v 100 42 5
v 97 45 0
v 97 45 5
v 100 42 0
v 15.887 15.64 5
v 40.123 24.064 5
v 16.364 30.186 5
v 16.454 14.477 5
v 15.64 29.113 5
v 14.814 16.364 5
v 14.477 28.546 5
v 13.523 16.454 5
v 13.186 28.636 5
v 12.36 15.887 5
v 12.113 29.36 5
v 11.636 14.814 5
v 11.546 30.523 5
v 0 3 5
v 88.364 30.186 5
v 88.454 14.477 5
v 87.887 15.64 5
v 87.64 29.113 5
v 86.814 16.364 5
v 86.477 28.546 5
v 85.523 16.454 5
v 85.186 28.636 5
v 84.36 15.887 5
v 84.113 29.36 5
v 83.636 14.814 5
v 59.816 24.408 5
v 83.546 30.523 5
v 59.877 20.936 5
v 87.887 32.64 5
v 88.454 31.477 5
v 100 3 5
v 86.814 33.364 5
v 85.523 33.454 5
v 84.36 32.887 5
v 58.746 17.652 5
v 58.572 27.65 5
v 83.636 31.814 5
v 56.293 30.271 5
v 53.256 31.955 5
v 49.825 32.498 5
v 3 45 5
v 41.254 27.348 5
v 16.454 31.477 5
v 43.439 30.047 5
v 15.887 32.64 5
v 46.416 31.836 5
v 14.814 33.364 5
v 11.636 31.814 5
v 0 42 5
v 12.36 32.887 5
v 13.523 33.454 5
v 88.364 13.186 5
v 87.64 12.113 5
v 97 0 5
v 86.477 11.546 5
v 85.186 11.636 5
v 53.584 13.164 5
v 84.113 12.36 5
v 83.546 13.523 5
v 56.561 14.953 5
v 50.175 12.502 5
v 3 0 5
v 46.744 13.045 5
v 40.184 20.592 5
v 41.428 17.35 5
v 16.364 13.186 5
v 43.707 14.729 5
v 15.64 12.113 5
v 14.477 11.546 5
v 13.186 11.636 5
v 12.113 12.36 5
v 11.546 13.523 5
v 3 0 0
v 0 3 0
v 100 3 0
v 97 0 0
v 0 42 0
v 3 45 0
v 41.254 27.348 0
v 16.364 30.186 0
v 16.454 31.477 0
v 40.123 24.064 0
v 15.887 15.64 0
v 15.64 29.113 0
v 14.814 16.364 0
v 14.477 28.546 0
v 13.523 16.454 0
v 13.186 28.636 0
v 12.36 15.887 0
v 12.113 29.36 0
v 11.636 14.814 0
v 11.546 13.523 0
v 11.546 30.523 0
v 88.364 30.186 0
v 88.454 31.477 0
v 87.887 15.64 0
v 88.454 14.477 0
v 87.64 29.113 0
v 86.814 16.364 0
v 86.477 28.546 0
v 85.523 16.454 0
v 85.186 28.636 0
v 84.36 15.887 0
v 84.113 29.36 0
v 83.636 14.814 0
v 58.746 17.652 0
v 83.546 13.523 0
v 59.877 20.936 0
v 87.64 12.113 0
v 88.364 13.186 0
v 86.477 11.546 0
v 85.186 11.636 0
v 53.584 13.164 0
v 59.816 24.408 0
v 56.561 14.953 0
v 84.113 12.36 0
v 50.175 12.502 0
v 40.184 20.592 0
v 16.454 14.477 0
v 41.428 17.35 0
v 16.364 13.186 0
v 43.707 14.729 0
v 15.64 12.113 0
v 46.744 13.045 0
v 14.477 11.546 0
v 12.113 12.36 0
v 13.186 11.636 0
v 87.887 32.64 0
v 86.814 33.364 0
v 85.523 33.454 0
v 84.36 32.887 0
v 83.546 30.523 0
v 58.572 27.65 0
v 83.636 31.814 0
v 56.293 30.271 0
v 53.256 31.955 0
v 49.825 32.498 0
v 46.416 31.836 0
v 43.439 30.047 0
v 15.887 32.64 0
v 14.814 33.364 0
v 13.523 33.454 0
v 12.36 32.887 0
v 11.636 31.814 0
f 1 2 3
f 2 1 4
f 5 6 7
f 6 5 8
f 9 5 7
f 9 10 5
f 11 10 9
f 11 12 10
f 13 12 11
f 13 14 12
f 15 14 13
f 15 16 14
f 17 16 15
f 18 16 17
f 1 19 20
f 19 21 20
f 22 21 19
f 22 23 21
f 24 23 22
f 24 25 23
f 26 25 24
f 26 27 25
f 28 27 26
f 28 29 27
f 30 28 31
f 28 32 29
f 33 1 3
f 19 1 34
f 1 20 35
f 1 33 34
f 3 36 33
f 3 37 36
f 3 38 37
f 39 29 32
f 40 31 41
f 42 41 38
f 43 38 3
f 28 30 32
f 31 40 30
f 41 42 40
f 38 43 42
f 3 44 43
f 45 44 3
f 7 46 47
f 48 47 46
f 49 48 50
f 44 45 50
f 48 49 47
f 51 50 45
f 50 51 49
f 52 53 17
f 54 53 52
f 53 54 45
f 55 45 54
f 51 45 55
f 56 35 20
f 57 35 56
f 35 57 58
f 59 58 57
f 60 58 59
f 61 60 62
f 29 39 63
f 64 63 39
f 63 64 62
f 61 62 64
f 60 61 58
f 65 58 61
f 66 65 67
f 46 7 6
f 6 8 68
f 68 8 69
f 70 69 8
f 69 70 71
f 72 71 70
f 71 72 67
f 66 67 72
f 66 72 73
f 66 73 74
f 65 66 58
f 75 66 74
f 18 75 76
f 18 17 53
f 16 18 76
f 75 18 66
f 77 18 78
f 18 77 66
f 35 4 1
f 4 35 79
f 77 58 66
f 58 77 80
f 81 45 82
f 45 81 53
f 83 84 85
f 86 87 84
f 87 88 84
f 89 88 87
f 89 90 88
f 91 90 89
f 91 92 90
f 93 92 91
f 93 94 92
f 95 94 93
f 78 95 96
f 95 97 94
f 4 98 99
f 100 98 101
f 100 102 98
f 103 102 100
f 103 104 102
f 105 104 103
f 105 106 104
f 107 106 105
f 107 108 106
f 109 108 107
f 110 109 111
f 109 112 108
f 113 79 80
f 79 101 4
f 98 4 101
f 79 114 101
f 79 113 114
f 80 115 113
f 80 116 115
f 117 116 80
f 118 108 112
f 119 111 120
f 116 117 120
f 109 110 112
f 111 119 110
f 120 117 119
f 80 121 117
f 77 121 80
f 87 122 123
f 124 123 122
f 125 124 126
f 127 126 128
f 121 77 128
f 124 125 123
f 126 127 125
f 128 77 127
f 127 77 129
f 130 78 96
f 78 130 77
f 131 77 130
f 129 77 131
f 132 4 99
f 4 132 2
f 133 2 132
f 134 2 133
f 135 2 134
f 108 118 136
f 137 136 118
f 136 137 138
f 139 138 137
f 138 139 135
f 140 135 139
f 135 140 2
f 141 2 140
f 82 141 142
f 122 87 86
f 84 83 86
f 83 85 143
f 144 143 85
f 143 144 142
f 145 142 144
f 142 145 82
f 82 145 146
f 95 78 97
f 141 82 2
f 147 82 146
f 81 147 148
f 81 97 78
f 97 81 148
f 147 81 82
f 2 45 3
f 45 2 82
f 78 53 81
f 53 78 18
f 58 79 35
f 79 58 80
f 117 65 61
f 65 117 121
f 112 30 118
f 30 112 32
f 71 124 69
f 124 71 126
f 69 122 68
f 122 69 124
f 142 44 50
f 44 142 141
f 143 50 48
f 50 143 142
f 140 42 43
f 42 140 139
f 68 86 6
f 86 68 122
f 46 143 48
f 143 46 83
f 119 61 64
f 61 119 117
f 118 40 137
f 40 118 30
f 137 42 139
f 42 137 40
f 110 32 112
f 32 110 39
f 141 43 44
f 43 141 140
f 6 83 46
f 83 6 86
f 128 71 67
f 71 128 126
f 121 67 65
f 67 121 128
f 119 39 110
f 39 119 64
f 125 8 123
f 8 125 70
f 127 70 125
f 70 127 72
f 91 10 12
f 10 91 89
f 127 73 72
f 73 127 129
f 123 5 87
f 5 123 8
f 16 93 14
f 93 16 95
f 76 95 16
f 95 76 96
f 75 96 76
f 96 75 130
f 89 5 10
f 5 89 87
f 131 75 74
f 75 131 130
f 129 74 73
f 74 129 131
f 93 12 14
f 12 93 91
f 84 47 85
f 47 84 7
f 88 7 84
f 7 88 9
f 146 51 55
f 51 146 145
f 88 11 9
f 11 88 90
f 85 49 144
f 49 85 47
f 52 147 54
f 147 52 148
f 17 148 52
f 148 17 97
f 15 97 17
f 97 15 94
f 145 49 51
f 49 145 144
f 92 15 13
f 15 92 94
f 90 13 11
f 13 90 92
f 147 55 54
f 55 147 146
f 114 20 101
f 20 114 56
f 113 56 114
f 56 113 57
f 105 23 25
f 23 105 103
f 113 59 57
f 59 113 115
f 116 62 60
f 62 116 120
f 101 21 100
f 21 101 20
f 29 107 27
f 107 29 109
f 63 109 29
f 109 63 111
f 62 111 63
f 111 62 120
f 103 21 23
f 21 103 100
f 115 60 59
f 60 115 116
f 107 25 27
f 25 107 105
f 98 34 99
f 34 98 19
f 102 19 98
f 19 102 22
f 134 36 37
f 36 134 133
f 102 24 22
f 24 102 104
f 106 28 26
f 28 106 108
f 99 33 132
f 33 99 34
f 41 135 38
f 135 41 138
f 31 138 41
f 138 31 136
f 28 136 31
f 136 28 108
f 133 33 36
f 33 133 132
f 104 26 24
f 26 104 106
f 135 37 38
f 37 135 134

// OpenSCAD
$fn = 32;

// ----------------------------------------------------------------------
// Spacer plate: rect 100 x 45
// ----------------------------------------------------------------------

// --- parameters (mm) ---
bore_r = 10;              // centre bore radius
bolt_r = 2.5;             // bolt hole radius
plate_t = 5;              // plate thickness, Z (extrusion height)
plate_l = 100;            // plate length, X
plate_w = 45;             // plate width, Y
inset = 14;               // corner hole inset
fit_tol = 0.1;            // declared fit tolerance (prompt contract)
free_tol = 0.5;           // declared free tolerance (prompt contract)

profile = [[3, 0], [97, 0], [100, 3], [100, 42], [97, 45], [3, 45], [0, 42], [0, 3]];  // primary outline, 8 points, counter clockwise
void_1 = [[59.816, 24.408], [58.572, 27.65], [56.293, 30.271], [53.256, 31.955], [49.825, 32.498], [46.416, 31.836], [43.439, 30.047], [41.254, 27.348], [40.123, 24.064], [40.184, 20.592], [41.428, 17.35], [43.707, 14.729], [46.744, 13.045], [50.175, 12.502], [53.584, 13.164], [56.561, 14.953], [58.746, 17.652], [59.877, 20.936]];  // centre bore, 18 points
void_2 = [[16.454, 14.477], [15.887, 15.64], [14.814, 16.364], [13.523, 16.454], [12.36, 15.887], [11.636, 14.814], [11.546, 13.523], [12.113, 12.36], [13.186, 11.636], [14.477, 11.546], [15.64, 12.113], [16.364, 13.186]];  // corner hole, 12 points
void_3 = [[16.454, 31.477], [15.887, 32.64], [14.814, 33.364], [13.523, 33.454], [12.36, 32.887], [11.636, 31.814], [11.546, 30.523], [12.113, 29.36], [13.186, 28.636], [14.477, 28.546], [15.64, 29.113], [16.364, 30.186]];  // corner hole, 12 points
void_4 = [[88.454, 14.477], [87.887, 15.64], [86.814, 16.364], [85.523, 16.454], [84.36, 15.887], [83.636, 14.814], [83.546, 13.523], [84.113, 12.36], [85.186, 11.636], [86.477, 11.546], [87.64, 12.113], [88.364, 13.186]];  // corner hole, 12 points
void_5 = [[88.454, 31.477], [87.887, 32.64], [86.814, 33.364], [85.523, 33.454], [84.36, 32.887], [83.636, 31.814], [83.546, 30.523], [84.113, 29.36], [85.186, 28.636], [86.477, 28.546], [87.64, 29.113], [88.364, 30.186]];  // corner hole, 12 points

// --- the one profile operation ---
difference() {
  linear_extrude(height = plate_t) polygon(points = profile);
  translate([0, 0, -1])
    linear_extrude(height = plate_t + 2) polygon(points = void_1);
  translate([0, 0, -1])
    linear_extrude(height = plate_t + 2) polygon(points = void_2);
  translate([0, 0, -1])
    linear_extrude(height = plate_t + 2) polygon(points = void_3);
  translate([0, 0, -1])
    linear_extrude(height = plate_t + 2) polygon(points = void_4);
  translate([0, 0, -1])
    linear_extrude(height = plate_t + 2) polygon(points = void_5);
}
